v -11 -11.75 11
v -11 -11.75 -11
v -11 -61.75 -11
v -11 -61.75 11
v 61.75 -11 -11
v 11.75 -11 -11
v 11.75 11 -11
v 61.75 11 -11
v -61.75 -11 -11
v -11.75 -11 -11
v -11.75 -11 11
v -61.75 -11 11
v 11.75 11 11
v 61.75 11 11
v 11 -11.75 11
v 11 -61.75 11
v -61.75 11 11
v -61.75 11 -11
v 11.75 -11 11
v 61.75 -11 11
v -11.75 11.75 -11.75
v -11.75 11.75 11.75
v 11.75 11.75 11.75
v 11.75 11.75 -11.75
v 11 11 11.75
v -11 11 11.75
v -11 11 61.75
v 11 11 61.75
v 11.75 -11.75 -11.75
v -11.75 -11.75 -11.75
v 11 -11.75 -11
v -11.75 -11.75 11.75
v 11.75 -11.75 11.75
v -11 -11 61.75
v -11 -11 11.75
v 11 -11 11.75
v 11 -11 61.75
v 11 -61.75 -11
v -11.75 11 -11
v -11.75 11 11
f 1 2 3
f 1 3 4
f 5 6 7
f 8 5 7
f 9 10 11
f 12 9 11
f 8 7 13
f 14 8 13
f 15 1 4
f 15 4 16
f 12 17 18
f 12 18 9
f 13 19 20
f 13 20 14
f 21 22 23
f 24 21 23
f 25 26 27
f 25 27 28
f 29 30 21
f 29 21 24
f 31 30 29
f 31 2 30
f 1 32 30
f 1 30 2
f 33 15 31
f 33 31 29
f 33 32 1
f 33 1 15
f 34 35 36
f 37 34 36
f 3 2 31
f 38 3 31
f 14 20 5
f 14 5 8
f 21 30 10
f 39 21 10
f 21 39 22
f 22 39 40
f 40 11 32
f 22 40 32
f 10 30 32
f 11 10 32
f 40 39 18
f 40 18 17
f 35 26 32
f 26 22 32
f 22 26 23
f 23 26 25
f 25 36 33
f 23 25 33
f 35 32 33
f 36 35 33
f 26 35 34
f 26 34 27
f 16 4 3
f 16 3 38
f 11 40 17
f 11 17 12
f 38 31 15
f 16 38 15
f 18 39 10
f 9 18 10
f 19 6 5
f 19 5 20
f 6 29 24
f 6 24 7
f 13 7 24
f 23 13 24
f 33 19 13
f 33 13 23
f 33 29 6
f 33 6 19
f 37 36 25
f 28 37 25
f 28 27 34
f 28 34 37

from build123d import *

# Parameters (mm, degrees)
F0_W     = 23.5
F0_H     = 23.5
F1_DEPTH = 11.75
F2_W     = 22
F2_H     = 22
F3_DEPTH = 50
F4_W     = 22
F4_H     = 22
F5_DEPTH = 50
F6_W     = 22
F6_H     = 22
F7_DEPTH = 50
F8_W     = 22
F8_H     = 22
F9_DEPTH = 50


with BuildPart() as f1:
    # F0 (on Front) → F1 (new body, symmetric)
    with BuildSketch(Plane.XZ):
        Rectangle(F0_W, F0_H)
    extrude(amount=F1_DEPTH, both=True)

    # F2 (on face) → F3 (join)
    with BuildSketch(Plane(origin=(-11.75, 0, 0), x_dir=(0, -1, 0), z_dir=(-1, 0, 0))):
        Rectangle(F2_W, F2_H)
    extrude(amount=F3_DEPTH)

    # F4 (on face) → F5 (join)
    with BuildSketch(Plane.XY.offset(11.75)):
        Rectangle(F4_W, F4_H)
    extrude(amount=F5_DEPTH)

    # F6 (on face) → F7 (join)
    with BuildSketch(Plane.XZ.offset(11.75)):
        Rectangle(F6_W, F6_H)
    extrude(amount=F7_DEPTH)

    # F8 (on face) → F9 (join)
    with BuildSketch(Plane.YZ.offset(11.75)):
        Rectangle(F8_W, F8_H)
    extrude(amount=F9_DEPTH)


solid = f1.part
